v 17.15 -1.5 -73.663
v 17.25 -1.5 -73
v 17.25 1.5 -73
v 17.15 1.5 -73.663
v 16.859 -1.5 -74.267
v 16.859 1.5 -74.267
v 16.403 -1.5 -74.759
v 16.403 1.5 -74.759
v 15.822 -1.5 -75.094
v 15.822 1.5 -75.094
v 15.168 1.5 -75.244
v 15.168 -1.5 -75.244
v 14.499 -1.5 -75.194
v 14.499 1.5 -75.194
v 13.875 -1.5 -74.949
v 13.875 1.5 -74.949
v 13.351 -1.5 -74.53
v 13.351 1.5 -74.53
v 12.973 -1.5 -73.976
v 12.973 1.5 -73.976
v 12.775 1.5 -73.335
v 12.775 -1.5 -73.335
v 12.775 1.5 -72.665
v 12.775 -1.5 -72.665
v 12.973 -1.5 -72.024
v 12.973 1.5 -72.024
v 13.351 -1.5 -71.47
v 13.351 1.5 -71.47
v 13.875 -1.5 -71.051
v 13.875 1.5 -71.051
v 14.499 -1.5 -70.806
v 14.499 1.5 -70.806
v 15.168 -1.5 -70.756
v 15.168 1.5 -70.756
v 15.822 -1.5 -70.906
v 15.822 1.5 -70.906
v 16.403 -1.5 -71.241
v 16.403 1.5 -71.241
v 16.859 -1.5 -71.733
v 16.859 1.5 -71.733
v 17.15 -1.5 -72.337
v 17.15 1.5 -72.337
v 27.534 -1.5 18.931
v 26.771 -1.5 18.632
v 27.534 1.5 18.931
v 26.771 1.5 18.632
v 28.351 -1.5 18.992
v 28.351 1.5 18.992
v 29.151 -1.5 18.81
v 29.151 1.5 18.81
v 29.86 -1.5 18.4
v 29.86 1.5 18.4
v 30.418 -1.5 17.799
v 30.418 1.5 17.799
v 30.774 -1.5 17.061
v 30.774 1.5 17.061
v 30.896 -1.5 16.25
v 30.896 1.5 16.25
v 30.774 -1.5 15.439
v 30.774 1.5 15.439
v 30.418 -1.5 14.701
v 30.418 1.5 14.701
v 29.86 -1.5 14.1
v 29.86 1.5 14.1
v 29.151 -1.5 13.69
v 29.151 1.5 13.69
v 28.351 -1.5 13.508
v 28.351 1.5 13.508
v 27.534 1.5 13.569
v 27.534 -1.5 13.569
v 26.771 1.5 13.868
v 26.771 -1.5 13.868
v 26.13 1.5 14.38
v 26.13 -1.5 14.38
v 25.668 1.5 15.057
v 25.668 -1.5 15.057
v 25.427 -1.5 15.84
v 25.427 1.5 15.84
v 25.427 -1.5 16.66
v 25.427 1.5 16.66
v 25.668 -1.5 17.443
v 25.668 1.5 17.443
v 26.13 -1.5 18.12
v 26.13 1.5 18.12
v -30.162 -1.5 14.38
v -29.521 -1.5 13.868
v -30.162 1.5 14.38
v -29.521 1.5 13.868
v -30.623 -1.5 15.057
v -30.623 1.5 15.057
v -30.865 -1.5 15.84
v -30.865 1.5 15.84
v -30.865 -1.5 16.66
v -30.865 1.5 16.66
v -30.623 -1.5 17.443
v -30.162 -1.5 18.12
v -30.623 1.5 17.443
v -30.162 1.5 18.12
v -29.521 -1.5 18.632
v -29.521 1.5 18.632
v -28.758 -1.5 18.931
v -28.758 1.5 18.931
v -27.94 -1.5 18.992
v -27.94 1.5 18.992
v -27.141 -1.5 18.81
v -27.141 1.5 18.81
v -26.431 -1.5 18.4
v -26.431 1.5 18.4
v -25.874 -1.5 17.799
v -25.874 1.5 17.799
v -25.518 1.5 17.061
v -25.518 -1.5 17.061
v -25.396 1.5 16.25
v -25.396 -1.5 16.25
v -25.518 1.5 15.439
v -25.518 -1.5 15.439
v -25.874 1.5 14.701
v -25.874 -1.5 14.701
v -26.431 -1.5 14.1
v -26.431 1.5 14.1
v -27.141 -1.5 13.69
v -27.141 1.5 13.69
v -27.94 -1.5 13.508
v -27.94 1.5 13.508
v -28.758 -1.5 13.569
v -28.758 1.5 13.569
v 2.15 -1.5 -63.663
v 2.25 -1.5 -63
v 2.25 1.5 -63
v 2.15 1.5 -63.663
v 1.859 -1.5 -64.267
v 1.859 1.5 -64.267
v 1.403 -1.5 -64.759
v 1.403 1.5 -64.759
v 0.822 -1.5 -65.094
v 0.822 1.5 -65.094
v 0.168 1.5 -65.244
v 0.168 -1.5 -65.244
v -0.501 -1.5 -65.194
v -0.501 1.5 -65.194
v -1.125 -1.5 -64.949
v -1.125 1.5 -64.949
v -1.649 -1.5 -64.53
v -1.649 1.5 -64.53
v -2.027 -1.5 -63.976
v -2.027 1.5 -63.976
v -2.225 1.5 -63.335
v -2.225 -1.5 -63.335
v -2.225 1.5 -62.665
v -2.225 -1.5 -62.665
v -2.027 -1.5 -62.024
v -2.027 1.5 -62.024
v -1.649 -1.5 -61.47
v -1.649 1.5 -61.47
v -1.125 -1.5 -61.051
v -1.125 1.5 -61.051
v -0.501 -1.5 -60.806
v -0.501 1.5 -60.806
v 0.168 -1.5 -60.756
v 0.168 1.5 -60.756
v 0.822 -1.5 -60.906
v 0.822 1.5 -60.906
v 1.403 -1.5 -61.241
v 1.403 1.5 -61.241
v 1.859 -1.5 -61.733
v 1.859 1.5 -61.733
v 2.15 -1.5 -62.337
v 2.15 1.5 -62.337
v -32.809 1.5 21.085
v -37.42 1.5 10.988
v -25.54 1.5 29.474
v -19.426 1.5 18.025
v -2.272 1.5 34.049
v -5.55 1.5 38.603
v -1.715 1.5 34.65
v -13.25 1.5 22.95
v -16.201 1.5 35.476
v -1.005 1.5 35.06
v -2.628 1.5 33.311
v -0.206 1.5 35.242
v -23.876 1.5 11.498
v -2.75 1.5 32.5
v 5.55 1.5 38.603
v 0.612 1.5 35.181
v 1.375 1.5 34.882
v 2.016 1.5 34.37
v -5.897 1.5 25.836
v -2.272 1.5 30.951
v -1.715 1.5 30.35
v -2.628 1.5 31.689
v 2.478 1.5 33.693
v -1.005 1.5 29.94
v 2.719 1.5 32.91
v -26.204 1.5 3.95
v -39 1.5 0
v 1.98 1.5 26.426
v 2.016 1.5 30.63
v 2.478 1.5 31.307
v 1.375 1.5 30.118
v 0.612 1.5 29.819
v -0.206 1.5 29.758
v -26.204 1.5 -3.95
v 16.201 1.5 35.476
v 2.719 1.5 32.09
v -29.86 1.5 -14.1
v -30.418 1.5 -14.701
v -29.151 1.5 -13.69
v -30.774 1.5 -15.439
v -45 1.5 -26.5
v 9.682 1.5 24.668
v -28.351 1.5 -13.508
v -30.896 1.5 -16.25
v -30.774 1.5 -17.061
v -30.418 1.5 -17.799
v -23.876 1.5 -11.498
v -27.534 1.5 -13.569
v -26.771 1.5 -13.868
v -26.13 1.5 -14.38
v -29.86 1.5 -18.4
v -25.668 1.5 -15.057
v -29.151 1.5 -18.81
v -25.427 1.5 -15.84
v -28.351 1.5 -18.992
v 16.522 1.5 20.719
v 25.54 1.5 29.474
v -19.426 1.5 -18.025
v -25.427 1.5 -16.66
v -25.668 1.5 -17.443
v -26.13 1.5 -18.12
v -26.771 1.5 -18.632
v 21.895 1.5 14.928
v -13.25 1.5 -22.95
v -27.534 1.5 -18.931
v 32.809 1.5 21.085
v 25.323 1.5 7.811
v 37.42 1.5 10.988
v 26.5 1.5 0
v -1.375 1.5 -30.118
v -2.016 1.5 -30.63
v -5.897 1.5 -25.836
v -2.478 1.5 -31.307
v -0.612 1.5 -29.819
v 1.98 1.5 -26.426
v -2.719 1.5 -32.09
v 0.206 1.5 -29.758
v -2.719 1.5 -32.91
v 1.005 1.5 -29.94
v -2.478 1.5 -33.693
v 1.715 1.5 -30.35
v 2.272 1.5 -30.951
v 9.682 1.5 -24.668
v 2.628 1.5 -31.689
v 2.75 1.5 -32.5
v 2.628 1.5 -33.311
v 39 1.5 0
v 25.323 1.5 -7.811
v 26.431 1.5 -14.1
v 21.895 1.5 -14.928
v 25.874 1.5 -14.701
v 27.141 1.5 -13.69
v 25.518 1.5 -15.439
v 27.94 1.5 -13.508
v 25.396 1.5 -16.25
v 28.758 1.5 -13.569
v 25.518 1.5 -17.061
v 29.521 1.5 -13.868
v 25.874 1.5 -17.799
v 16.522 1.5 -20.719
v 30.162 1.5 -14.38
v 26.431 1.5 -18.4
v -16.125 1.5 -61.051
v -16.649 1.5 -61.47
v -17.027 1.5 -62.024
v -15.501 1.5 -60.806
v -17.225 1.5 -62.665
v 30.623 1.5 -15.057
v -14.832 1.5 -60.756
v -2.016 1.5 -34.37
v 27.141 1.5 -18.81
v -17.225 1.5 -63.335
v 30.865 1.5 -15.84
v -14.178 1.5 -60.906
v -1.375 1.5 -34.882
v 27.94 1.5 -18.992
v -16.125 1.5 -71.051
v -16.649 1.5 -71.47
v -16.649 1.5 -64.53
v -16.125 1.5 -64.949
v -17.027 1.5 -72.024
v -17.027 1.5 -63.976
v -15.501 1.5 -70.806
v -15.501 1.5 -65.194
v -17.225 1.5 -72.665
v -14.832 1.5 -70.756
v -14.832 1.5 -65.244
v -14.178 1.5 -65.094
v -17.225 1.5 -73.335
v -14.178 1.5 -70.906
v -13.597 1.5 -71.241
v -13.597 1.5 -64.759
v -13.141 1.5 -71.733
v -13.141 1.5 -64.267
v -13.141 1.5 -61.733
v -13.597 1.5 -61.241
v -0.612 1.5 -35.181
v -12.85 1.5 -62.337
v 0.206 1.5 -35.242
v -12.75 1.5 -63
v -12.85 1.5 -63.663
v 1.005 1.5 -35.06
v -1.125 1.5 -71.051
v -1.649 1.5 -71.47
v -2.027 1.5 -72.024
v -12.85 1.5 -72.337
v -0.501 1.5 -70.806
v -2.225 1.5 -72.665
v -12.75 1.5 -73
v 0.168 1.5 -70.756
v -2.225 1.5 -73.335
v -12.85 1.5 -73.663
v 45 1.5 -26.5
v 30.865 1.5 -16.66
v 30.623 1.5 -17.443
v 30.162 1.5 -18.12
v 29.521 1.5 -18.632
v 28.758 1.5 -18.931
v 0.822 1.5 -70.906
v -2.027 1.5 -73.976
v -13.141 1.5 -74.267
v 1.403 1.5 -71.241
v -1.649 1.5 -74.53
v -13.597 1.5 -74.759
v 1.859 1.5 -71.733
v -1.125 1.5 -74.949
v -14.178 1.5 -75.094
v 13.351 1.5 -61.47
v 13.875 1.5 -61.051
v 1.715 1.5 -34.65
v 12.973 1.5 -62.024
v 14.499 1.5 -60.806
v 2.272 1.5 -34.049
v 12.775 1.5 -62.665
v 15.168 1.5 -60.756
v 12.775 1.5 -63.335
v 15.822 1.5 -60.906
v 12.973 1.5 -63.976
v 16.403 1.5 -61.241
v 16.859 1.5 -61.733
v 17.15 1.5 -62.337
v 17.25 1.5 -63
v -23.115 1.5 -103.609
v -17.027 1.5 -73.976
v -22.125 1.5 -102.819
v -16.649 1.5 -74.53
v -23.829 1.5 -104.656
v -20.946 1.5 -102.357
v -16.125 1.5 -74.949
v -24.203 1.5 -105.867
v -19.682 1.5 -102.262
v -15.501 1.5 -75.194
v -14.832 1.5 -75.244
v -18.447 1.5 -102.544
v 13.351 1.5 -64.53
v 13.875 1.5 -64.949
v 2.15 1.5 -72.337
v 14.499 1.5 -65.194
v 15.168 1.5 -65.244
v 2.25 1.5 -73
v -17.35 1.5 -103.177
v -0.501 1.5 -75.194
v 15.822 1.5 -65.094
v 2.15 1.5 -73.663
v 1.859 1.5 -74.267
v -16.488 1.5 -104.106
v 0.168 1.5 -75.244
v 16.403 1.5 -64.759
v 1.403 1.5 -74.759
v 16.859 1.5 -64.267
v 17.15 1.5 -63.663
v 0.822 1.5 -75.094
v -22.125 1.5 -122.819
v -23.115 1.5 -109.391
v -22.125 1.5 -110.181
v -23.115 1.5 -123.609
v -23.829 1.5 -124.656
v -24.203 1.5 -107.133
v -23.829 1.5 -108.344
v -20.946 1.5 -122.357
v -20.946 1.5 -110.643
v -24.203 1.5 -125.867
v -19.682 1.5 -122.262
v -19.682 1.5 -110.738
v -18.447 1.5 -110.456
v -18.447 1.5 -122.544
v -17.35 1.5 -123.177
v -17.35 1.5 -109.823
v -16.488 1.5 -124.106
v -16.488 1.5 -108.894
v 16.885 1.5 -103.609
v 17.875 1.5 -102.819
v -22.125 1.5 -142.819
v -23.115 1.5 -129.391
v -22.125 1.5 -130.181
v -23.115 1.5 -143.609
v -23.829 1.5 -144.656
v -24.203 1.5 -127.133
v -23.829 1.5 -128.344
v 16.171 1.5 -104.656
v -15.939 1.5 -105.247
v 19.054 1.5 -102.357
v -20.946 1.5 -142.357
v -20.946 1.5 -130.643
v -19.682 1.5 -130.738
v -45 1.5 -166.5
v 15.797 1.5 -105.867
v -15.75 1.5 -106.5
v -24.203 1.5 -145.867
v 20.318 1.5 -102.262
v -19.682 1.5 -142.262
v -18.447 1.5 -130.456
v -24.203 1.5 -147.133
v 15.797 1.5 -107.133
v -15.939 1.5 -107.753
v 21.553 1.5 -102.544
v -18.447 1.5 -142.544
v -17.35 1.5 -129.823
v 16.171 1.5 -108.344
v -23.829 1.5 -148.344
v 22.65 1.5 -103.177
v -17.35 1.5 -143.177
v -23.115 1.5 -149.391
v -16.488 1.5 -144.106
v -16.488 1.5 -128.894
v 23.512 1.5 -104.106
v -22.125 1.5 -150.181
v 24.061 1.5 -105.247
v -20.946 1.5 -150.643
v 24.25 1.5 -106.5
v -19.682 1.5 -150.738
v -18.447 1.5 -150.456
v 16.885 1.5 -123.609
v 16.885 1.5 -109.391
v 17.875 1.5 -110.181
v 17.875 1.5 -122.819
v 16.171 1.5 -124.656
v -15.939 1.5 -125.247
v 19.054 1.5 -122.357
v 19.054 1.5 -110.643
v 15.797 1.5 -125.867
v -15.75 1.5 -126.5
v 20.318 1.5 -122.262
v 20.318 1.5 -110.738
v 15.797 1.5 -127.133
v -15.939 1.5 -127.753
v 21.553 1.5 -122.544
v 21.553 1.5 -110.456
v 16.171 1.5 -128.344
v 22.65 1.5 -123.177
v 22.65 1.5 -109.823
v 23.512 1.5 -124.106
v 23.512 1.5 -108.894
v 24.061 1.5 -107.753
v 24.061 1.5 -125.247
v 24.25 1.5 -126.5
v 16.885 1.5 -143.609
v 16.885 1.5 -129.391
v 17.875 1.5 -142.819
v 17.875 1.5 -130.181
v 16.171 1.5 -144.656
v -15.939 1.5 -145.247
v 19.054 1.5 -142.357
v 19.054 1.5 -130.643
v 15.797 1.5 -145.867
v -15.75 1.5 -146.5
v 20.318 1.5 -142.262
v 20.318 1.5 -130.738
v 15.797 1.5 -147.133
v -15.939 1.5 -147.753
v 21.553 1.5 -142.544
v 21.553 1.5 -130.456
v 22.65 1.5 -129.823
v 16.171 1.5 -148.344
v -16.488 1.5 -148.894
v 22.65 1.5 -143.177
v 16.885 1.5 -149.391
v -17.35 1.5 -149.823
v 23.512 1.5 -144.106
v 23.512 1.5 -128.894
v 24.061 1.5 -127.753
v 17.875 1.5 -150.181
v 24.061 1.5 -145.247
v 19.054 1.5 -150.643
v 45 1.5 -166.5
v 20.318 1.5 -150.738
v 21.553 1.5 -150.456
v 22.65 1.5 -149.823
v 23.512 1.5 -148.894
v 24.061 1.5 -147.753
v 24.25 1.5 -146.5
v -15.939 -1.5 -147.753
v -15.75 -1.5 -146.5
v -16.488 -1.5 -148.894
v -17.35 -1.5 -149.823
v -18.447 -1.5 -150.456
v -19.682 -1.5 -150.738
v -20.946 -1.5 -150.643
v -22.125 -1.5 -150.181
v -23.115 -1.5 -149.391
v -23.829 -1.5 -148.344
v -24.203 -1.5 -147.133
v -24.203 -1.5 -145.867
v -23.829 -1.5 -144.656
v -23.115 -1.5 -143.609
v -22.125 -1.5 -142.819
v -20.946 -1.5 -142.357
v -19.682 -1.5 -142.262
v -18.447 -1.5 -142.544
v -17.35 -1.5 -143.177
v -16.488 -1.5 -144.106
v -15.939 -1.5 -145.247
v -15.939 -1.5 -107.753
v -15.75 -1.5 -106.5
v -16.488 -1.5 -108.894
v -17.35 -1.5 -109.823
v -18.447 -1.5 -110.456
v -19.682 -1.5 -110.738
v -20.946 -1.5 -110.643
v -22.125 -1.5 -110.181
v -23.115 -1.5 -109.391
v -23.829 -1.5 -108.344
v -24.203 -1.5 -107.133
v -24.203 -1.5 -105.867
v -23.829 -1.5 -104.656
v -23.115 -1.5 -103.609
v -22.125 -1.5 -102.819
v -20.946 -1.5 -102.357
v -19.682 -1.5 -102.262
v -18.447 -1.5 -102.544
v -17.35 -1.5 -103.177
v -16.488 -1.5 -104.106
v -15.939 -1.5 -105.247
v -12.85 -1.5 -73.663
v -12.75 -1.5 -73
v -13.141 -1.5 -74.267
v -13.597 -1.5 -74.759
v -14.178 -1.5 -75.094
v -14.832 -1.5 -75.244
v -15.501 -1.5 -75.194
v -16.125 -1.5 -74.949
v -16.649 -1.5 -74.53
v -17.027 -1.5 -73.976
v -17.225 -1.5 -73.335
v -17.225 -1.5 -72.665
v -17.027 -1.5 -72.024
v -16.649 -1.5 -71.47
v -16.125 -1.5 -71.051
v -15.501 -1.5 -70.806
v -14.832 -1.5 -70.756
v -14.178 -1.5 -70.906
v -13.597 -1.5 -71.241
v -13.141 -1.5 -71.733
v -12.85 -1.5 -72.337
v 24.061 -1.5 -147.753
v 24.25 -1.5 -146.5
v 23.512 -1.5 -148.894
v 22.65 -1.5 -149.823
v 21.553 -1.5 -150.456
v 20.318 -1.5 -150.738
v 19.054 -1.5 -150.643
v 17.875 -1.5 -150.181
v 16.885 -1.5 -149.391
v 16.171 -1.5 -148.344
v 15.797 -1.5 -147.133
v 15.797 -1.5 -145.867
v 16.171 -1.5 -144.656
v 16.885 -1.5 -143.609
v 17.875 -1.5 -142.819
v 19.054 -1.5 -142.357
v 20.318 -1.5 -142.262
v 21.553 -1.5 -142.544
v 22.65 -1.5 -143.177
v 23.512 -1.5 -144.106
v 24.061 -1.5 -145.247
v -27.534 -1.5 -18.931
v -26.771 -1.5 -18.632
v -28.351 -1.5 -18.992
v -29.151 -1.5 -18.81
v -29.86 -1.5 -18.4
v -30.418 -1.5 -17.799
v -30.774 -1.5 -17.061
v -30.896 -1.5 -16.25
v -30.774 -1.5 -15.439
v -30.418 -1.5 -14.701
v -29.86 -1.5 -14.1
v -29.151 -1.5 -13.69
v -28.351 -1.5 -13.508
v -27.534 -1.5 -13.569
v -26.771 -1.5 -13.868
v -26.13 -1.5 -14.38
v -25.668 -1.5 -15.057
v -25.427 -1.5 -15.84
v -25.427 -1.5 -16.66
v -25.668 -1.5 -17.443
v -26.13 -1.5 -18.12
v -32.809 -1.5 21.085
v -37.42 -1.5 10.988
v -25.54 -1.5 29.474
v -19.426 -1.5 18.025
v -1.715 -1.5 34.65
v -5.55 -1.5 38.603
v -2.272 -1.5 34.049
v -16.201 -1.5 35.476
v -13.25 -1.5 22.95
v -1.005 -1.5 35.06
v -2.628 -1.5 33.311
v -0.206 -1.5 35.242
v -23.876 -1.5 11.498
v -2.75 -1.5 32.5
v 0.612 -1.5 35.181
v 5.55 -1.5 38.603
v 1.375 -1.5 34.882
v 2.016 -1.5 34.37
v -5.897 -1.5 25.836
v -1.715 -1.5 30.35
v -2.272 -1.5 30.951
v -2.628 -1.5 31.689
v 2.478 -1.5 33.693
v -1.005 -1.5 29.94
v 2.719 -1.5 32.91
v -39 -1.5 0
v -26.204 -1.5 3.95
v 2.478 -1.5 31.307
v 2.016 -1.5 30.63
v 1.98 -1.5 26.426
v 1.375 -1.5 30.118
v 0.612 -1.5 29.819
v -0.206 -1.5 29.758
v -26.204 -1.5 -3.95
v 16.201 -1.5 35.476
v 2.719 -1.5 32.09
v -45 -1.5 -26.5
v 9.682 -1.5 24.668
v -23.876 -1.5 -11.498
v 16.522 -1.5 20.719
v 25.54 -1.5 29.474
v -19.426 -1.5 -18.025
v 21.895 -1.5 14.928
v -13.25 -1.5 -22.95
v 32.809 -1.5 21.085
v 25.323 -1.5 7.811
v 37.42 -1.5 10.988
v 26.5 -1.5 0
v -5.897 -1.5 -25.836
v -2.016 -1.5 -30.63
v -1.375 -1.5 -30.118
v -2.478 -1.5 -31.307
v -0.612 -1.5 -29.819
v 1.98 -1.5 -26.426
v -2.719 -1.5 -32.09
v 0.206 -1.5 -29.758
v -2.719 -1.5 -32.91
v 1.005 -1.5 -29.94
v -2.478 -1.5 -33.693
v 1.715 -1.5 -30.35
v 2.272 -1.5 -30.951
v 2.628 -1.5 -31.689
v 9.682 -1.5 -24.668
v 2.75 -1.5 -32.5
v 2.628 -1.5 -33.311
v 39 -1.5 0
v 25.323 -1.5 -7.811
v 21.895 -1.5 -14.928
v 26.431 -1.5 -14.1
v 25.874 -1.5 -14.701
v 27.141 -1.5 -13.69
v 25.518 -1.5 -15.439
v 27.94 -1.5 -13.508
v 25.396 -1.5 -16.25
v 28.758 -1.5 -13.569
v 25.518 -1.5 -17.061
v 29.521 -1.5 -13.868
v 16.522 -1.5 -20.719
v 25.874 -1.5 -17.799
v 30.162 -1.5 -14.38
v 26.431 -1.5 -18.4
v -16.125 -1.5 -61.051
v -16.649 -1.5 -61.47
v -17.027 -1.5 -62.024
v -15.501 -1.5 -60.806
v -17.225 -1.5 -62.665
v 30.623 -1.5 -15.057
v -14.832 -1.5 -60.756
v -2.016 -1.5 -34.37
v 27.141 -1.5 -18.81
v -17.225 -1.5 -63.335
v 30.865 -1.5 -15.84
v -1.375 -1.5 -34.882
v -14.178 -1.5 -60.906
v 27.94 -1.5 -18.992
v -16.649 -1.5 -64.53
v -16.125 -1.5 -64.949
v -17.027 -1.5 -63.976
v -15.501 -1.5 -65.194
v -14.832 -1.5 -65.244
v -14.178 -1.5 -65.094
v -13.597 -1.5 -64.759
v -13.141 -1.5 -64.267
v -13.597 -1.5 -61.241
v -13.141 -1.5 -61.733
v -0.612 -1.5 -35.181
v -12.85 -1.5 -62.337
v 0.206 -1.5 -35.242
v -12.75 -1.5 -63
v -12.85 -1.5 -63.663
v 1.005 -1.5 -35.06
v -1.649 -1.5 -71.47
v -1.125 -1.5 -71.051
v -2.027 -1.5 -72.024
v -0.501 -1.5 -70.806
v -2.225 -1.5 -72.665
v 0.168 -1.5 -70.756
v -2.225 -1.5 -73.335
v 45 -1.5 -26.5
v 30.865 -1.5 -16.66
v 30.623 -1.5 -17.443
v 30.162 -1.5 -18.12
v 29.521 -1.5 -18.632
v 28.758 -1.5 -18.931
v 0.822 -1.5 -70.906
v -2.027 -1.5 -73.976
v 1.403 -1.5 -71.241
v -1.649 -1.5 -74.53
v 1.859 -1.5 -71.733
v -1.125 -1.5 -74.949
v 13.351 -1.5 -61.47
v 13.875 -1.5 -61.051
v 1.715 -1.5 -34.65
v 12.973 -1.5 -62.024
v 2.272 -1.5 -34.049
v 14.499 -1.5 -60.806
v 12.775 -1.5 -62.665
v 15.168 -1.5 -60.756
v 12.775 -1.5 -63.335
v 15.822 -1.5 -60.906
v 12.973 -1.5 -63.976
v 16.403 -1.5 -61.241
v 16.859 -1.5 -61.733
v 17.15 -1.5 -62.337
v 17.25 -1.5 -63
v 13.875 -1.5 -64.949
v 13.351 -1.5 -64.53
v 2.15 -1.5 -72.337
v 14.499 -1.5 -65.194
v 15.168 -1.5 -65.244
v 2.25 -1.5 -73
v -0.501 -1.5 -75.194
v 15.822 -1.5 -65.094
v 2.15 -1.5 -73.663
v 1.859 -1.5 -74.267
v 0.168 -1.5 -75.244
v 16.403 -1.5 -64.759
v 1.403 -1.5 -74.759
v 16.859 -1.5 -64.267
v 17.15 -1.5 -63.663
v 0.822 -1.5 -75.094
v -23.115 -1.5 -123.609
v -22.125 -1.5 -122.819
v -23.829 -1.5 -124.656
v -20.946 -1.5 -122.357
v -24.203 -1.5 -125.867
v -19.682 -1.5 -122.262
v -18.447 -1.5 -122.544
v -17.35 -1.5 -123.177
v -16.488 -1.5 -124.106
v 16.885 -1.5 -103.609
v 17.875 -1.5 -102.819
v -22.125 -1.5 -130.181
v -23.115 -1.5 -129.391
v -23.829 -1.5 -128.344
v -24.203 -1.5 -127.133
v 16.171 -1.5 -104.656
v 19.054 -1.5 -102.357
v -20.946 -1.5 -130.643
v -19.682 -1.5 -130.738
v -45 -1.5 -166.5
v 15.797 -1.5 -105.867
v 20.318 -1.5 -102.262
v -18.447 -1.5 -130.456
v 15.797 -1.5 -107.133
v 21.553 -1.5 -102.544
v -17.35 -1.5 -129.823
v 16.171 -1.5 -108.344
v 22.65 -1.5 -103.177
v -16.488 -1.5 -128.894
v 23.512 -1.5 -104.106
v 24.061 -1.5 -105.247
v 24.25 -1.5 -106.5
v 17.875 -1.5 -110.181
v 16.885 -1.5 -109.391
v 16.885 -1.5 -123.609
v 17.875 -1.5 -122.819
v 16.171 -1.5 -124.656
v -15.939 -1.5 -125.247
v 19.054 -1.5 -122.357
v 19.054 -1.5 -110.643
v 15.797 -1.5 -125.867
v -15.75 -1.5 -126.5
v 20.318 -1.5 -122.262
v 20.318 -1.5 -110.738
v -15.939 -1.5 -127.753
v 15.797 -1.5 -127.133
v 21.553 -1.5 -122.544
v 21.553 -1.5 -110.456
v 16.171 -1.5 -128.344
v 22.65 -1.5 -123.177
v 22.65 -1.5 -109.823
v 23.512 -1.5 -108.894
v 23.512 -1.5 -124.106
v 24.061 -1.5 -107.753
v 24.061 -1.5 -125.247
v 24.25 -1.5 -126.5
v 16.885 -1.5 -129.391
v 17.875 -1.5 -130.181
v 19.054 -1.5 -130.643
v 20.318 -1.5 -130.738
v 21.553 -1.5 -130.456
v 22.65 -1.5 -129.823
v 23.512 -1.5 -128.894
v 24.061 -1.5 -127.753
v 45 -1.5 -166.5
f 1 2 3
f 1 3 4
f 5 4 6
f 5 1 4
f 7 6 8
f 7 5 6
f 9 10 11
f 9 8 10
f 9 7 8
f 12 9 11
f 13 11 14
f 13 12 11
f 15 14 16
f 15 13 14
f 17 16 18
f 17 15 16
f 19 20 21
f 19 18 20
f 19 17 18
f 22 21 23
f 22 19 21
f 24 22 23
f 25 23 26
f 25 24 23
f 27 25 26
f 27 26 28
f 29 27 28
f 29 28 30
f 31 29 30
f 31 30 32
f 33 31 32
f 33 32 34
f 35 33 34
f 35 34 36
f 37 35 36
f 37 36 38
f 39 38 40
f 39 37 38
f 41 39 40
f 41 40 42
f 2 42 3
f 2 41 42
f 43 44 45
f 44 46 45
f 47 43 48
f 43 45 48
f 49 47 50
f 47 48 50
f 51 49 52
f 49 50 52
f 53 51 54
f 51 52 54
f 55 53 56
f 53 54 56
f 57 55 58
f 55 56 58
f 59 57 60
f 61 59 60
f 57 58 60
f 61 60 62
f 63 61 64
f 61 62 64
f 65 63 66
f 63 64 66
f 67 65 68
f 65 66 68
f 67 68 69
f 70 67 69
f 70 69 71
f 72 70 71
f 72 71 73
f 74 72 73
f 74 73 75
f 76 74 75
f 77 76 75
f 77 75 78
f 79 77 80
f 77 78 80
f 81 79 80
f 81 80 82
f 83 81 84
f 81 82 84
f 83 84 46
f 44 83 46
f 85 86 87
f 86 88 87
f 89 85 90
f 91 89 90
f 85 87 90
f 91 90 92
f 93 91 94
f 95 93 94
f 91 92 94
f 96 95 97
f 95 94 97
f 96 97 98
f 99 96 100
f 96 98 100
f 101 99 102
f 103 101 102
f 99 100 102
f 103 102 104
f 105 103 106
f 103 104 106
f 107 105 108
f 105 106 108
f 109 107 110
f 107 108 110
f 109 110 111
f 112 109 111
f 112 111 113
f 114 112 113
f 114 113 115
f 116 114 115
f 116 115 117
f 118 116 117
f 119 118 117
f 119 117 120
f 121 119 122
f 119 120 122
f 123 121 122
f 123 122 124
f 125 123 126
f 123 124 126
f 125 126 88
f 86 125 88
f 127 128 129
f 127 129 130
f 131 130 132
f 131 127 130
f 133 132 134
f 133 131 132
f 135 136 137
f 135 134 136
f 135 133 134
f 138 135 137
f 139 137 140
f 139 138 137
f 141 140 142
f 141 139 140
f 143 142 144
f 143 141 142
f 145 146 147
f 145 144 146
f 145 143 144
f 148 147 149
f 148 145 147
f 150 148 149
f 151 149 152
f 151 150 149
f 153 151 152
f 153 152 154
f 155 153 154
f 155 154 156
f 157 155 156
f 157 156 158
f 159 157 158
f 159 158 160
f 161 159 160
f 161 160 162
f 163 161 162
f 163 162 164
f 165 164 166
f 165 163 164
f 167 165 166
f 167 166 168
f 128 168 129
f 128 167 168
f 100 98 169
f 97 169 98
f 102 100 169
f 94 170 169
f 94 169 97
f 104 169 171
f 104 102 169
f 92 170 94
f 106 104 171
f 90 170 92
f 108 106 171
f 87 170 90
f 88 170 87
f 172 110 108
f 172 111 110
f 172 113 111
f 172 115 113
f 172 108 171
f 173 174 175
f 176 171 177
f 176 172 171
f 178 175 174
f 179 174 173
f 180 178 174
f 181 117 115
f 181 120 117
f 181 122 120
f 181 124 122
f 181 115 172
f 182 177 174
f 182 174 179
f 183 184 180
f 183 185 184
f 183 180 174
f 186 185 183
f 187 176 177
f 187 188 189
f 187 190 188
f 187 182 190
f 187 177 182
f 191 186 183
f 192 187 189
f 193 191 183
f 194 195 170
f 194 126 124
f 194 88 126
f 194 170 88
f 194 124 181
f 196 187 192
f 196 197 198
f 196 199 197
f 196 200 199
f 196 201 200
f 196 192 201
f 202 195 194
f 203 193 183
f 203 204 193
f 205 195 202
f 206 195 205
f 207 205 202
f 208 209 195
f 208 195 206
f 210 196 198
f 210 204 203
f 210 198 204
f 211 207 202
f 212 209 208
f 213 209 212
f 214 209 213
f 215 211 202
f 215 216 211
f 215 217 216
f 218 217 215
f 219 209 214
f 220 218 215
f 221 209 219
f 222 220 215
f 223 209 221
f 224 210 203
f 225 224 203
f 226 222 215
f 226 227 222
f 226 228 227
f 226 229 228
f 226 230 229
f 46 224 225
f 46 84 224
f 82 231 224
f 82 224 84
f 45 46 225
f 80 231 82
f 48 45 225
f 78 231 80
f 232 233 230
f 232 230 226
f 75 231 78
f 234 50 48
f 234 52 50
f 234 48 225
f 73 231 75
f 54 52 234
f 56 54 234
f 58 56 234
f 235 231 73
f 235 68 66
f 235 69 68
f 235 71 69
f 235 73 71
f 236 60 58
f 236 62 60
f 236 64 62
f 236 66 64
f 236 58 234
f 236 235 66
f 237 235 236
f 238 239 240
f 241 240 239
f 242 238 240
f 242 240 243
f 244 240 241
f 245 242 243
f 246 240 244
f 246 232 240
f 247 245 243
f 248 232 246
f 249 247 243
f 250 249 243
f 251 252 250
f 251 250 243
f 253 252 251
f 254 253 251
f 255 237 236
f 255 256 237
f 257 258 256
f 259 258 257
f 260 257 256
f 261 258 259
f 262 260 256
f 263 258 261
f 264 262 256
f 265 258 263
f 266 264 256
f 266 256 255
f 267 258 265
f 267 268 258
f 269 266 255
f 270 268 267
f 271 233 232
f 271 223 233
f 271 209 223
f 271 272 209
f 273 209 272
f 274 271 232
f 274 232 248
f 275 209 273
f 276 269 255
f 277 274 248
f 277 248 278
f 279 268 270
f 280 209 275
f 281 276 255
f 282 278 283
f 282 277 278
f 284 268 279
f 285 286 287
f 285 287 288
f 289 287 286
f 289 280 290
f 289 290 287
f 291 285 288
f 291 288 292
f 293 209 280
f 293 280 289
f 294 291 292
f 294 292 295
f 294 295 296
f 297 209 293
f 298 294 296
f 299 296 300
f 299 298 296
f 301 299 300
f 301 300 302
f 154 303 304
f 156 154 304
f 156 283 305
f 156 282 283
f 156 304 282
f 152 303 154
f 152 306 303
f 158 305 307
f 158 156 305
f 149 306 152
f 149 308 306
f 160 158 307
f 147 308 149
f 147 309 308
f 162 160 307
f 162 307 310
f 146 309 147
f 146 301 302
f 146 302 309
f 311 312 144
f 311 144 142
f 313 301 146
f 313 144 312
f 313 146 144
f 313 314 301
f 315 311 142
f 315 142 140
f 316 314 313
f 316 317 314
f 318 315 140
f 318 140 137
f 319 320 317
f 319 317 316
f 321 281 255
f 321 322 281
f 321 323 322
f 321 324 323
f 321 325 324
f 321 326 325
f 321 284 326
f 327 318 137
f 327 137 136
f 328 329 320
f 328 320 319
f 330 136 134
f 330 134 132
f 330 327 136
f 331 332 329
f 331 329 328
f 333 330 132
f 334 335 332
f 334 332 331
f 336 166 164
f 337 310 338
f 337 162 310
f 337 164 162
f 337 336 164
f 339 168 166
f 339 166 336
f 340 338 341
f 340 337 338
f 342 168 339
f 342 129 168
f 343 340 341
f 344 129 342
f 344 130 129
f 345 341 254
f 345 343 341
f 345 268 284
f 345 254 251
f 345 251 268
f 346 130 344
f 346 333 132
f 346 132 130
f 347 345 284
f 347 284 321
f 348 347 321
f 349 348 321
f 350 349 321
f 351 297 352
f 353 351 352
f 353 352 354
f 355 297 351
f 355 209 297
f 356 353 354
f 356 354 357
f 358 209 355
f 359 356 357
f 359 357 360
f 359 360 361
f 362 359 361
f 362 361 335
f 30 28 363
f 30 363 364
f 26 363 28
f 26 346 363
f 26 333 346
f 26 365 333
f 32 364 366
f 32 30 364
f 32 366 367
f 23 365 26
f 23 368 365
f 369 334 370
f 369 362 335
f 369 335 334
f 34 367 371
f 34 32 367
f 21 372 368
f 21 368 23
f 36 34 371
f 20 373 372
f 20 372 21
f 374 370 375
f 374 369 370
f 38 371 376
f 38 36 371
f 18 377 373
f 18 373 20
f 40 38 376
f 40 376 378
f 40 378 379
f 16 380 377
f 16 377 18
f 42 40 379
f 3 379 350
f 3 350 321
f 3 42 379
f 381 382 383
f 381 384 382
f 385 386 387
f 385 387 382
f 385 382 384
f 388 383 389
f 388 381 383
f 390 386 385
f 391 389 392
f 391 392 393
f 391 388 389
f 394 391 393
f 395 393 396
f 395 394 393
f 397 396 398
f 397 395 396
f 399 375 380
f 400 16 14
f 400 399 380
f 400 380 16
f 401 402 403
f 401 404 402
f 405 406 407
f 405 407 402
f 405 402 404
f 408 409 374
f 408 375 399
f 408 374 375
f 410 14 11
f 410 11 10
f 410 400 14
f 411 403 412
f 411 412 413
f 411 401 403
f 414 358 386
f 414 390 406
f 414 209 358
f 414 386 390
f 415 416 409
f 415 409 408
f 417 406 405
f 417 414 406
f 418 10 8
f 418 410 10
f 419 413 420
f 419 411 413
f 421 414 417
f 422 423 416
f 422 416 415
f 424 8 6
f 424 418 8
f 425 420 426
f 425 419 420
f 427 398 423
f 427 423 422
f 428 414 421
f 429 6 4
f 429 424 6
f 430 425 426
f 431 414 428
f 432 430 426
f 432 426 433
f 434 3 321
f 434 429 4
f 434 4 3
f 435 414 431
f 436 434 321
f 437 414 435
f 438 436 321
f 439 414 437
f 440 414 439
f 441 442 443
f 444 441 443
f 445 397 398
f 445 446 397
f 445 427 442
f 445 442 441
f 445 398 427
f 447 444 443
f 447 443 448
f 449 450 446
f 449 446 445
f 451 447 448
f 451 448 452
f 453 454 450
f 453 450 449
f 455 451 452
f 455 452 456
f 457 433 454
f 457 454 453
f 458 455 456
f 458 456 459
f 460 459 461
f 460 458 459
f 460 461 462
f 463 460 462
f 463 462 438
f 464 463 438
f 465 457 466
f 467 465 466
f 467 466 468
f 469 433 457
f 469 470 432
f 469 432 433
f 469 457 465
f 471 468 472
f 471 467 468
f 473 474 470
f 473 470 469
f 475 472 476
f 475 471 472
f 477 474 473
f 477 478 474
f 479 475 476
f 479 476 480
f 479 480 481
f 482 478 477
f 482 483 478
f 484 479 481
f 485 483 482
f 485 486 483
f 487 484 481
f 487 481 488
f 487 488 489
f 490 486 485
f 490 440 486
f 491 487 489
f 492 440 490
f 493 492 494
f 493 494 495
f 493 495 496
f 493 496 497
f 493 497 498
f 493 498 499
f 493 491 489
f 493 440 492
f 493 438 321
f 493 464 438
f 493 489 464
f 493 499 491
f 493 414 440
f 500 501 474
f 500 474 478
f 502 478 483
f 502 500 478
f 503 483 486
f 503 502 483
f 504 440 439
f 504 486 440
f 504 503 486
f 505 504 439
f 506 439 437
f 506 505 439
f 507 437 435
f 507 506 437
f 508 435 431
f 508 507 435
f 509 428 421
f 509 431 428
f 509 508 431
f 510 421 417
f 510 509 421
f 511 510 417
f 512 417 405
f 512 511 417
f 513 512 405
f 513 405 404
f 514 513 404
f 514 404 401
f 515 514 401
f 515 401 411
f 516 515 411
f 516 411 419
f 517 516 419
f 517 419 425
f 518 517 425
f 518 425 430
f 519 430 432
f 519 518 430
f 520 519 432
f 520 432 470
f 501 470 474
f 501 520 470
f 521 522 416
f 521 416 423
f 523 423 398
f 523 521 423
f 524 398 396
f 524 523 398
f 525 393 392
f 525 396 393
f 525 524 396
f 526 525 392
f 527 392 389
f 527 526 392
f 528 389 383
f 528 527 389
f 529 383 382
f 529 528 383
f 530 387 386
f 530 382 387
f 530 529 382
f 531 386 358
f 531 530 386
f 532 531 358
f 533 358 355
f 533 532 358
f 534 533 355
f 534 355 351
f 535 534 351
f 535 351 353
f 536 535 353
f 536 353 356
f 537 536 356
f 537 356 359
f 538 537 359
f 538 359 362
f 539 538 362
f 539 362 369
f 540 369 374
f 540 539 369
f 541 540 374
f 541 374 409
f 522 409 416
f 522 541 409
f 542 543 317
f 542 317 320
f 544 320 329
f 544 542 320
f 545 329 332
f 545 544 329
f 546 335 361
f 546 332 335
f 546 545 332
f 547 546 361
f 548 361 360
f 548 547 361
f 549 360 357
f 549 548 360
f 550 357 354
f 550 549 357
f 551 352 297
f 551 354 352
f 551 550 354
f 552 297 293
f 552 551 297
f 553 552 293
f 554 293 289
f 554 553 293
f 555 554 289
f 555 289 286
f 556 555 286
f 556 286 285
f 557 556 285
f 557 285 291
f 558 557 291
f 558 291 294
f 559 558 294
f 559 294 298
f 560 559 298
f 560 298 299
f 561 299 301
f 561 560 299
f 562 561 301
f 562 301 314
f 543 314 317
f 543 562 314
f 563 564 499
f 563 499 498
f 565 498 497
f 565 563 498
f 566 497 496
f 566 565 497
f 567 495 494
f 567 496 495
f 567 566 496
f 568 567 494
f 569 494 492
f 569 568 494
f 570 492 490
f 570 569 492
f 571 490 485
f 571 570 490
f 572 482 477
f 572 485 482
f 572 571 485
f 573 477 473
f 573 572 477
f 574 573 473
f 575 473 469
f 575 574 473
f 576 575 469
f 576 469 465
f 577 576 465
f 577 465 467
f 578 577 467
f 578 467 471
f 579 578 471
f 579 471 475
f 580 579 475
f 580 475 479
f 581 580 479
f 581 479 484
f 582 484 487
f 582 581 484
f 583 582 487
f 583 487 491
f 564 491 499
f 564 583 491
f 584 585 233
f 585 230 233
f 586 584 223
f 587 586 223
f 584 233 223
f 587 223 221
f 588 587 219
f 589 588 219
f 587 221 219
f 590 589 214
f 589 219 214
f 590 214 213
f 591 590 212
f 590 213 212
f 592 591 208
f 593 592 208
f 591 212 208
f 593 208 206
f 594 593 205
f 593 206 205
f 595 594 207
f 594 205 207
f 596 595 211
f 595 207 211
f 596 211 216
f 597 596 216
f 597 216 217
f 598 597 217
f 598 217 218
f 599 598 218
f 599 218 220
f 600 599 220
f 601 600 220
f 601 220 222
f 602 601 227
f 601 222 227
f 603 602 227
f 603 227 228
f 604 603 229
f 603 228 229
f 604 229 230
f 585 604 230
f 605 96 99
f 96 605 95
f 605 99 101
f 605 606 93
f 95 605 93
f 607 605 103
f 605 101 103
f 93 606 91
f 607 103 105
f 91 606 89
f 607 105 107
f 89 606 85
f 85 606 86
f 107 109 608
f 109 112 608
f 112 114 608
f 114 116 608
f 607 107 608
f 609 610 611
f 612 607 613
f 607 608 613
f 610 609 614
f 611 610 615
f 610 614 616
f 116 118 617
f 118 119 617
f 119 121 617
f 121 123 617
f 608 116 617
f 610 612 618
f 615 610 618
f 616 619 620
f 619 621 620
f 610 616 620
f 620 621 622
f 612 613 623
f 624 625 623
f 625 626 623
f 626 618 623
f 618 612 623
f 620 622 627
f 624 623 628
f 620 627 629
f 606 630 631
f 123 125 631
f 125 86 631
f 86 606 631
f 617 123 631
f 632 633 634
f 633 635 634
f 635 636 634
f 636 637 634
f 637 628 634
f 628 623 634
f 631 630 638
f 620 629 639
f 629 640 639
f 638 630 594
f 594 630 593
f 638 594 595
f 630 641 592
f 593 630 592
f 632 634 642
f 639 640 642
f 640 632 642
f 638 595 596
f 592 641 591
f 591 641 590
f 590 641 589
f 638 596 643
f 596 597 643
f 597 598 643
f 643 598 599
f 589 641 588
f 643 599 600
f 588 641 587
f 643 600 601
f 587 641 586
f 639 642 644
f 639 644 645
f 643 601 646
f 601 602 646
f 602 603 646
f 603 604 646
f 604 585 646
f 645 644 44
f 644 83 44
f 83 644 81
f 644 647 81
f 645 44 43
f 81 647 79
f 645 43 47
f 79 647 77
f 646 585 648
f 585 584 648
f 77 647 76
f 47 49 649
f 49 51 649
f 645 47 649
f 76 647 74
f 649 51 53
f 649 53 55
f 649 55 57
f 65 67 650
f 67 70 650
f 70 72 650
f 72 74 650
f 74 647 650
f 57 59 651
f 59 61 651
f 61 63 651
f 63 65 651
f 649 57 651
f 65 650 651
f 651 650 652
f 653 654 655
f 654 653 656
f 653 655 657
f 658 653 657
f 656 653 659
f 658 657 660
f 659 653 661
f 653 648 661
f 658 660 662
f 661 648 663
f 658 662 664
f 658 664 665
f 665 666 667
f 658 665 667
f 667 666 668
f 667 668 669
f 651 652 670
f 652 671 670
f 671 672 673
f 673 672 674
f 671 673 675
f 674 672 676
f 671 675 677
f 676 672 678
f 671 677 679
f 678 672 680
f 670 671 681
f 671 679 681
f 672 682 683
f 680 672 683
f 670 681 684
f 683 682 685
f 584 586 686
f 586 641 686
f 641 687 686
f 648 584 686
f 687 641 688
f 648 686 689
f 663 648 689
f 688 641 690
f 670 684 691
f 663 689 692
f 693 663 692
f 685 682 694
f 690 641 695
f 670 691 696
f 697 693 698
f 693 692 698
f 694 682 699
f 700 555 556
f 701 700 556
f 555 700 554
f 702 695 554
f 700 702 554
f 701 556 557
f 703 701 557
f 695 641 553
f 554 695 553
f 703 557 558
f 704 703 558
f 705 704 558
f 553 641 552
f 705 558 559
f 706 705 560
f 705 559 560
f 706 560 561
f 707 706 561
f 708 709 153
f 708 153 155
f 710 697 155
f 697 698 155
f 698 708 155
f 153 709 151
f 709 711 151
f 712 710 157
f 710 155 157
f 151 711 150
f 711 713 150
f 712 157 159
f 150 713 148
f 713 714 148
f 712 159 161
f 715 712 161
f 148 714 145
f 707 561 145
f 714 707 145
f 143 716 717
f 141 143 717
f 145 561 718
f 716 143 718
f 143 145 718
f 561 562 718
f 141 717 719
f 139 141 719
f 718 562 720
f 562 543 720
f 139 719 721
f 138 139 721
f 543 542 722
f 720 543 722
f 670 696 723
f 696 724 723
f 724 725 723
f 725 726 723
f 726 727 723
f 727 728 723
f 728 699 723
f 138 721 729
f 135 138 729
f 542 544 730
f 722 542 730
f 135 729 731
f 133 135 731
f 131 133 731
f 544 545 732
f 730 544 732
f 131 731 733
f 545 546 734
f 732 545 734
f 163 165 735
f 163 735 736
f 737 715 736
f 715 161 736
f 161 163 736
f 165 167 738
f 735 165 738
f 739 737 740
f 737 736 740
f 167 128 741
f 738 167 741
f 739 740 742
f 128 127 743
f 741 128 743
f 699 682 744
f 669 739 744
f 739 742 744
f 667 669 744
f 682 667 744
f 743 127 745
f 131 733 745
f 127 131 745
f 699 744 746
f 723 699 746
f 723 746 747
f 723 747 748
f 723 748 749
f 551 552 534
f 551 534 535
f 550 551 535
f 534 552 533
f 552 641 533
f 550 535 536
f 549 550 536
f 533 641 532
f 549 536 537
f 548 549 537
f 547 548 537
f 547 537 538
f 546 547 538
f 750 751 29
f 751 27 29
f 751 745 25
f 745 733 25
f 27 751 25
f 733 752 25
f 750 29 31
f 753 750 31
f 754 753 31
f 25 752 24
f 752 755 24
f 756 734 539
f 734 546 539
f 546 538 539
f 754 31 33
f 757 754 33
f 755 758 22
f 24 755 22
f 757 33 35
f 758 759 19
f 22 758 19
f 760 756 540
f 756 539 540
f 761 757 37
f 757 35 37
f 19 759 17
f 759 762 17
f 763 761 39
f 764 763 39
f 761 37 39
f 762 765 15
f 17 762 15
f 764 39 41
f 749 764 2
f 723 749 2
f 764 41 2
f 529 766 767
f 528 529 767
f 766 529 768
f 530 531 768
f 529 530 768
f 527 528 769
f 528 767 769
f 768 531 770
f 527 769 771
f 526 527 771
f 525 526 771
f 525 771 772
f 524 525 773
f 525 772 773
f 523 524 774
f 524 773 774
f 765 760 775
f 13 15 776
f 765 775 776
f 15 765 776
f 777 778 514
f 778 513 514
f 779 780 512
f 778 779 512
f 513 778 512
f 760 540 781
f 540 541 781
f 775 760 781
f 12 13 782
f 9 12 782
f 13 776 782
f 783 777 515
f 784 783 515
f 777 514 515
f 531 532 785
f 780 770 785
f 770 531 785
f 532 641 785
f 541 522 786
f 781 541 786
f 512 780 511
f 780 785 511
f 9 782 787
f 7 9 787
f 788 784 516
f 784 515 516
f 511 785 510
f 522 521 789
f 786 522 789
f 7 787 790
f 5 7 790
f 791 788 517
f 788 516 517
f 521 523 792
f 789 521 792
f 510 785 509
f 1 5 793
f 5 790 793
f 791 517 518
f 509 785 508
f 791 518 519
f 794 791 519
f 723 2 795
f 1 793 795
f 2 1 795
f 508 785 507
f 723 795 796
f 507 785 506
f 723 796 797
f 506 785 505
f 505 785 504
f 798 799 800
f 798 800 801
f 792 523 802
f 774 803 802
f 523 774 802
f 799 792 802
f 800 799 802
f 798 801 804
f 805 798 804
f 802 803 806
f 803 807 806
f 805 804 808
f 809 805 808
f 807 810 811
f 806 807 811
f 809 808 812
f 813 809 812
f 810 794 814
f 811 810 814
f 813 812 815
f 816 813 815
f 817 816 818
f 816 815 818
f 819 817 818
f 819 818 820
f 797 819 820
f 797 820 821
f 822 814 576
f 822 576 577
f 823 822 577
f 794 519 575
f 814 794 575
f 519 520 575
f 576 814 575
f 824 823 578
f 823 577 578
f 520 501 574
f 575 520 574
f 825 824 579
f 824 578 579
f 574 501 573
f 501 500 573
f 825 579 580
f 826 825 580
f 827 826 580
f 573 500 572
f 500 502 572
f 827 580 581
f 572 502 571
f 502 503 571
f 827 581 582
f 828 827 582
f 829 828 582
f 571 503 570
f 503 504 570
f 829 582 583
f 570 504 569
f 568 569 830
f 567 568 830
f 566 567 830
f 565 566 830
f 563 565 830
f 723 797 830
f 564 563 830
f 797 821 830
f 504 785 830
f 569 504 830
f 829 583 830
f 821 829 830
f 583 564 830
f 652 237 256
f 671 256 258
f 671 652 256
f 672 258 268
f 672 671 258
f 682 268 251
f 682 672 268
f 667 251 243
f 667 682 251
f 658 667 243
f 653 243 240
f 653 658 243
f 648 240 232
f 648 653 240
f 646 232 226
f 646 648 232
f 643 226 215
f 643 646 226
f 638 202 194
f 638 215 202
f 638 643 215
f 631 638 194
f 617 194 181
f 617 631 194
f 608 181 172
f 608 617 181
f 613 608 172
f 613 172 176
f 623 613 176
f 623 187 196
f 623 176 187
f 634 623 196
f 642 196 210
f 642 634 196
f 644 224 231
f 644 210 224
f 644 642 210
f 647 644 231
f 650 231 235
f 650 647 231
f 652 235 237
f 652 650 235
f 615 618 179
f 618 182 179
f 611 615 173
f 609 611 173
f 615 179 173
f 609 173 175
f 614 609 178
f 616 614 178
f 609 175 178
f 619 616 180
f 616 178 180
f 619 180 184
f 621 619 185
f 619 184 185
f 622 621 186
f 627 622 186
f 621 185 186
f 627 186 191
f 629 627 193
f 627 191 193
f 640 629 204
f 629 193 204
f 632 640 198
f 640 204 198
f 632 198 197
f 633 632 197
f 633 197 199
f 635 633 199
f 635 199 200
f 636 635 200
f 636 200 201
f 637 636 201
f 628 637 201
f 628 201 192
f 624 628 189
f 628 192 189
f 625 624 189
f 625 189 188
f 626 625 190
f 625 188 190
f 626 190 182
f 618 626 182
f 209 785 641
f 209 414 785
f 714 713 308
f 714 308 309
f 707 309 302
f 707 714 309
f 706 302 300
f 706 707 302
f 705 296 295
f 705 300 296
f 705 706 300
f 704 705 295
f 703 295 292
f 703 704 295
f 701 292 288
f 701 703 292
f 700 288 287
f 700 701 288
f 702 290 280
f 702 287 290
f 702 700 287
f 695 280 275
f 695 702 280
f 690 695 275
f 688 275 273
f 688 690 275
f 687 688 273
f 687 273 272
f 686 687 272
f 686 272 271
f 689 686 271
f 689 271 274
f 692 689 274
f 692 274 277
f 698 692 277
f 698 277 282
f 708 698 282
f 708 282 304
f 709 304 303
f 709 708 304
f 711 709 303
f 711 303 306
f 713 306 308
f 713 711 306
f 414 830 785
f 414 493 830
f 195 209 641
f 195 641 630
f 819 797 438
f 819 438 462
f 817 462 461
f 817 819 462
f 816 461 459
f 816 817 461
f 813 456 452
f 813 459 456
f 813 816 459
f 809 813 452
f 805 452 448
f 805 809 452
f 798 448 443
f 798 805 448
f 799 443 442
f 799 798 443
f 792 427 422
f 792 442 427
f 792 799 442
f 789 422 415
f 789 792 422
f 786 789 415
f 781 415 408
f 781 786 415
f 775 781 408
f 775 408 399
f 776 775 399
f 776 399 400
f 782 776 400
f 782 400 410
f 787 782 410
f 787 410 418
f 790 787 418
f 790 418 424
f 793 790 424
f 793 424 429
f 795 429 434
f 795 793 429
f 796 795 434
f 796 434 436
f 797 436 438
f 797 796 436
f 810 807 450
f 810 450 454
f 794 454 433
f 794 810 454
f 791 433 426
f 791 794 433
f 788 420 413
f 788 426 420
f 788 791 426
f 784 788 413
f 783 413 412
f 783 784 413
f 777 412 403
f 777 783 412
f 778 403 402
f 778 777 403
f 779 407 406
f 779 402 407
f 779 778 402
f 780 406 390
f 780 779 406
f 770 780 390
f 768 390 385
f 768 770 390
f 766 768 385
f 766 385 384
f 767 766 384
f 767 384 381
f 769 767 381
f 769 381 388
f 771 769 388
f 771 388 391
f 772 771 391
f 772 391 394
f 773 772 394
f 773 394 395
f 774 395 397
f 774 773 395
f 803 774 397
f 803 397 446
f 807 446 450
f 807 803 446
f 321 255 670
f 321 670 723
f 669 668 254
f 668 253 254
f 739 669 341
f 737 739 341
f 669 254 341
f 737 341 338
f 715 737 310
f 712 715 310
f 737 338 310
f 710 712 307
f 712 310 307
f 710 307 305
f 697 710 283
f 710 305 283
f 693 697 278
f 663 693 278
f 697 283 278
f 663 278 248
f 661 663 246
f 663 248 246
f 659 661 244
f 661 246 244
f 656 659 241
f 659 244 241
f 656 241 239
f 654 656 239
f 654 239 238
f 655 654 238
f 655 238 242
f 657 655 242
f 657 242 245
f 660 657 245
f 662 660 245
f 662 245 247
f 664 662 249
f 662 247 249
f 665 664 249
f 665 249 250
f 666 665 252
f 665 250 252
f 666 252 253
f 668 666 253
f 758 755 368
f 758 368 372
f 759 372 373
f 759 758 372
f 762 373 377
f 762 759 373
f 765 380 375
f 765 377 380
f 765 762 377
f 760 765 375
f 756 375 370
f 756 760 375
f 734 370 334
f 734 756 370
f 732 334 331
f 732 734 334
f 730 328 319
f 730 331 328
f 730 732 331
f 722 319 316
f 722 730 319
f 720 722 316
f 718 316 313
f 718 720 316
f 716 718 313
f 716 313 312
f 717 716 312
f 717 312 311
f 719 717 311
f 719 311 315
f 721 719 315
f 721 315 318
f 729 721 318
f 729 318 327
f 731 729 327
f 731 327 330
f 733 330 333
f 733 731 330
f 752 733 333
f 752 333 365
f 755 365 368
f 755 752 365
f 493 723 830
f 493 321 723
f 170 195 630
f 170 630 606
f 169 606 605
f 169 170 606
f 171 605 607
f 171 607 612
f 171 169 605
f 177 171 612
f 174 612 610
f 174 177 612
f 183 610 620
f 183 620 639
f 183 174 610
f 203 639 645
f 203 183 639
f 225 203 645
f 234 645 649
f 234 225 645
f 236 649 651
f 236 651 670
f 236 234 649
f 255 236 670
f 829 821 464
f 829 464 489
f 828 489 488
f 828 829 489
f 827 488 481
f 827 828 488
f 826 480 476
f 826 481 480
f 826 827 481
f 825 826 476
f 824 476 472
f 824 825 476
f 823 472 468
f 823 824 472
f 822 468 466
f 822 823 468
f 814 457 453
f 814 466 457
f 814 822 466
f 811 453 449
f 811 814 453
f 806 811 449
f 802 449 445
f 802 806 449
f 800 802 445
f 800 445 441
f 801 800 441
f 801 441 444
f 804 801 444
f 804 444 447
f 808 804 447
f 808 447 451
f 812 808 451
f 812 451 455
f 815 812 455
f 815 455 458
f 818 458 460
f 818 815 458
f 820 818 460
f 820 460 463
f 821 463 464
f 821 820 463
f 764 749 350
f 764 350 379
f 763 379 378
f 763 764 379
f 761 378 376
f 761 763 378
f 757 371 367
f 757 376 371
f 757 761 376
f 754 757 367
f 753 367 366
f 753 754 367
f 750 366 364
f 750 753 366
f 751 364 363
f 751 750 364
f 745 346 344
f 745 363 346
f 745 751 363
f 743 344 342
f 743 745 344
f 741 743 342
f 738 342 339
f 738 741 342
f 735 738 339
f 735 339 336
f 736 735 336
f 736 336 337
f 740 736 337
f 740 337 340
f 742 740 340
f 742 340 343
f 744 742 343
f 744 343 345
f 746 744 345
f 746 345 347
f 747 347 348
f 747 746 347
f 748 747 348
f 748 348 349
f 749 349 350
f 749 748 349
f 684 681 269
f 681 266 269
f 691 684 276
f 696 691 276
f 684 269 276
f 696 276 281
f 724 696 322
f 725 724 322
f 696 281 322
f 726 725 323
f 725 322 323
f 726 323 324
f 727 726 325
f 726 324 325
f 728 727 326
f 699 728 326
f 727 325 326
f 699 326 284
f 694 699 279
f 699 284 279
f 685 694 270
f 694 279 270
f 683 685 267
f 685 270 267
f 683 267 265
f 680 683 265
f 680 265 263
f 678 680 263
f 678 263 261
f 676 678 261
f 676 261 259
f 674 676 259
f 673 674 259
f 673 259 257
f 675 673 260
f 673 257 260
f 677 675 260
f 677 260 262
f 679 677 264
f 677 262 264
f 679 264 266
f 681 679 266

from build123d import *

# Parameters (mm, degrees)
SKETCH1_R            = 39
SKETCH1_R_2          = 26.5
BOSS_EXTRUDE1_DEPTH  = 1.5
SKETCH3_W            = 50
SKETCH3_H            = 51.5
BOSS_EXTRUDE2_DEPTH  = 1.5
BOSS_EXTRUDE4_DEPTH  = 1.5
SKETCH2_R            = 2.75
CUT_EXTRUDE1_DEPTH   = 2.5
CIRPATTERN1_COUNT    = 6
CUT_EXTRUDE2_START   = -4
SKETCH5_R            = 2.25
CUT_EXTRUDE2_DEPTH   = 5
LPATTERN1_COUNT      = 2
LPATTERN1_PITCH      = 15
LPATTERN1_COUNT_DIR2 = 2
LPATTERN1_PITCH_DIR2 = 10
LPATTERN2_COUNT      = 2
LPATTERN2_PITCH      = 15
LPATTERN2_COUNT_DIR2 = 2
LPATTERN2_PITCH_DIR2 = 10
CUT_EXTRUDE3_START   = -4
SKETCH7_R            = 4.25
CUT_EXTRUDE3_DEPTH   = 5
LPATTERN3_COUNT      = 3
LPATTERN3_PITCH      = 20


with BuildPart() as part:
    # Sketch1 → Boss-Extrude1 (new body, symmetric)
    with BuildSketch(Plane(origin=(0, 0, 0), x_dir=(1, 0, 0), z_dir=(0, 1, 0))):
        Circle(SKETCH1_R)
        Circle(SKETCH1_R_2, mode=Mode.SUBTRACT)
    extrude(amount=BOSS_EXTRUDE1_DEPTH, both=True)

    # Sketch3 → Boss-Extrude2 (add, symmetric)
    with BuildSketch(Plane(origin=(0, 0, 0), x_dir=(1, 0, 0), z_dir=(0, 1, 0))):
        with Locations((0, 52.25)):
            Rectangle(SKETCH3_W, SKETCH3_H)
    extrude(amount=BOSS_EXTRUDE2_DEPTH, both=True)

    # Sketch6 → Boss-Extrude4 (add, symmetric)
    with BuildSketch(Plane(origin=(0, 0, 0), x_dir=(1, 0, 0), z_dir=(0, 1, 0))):
        Polygon((-45, 166.5), (-45, 26.5), (-39, 0), (-14.981514186, 26.5), (16.520833333, 26.5), (39, 0), (45, 26.5), (45, 166.5), align=None)
    extrude(amount=BOSS_EXTRUDE4_DEPTH, both=True)

    # Sketch2 → Cut-Extrude1 (cut, symmetric)
    with BuildSketch(Plane(origin=(0, 0, 0), x_dir=(1, 0, 0), z_dir=(0, 1, 0))):
        with Locations((0, 32.5)):
            Circle(SKETCH2_R)
    cut_extrude1 = extrude(amount=CUT_EXTRUDE1_DEPTH, both=True, mode=Mode.SUBTRACT)

    # CirPattern1: Cut-Extrude1 ×6 about axis
    cirpattern1_axis = Axis((0, 0, 0), (0, 1, 0))
    for i in range(1, CIRPATTERN1_COUNT):
        add(cut_extrude1.rotate(cirpattern1_axis, i * 360 / CIRPATTERN1_COUNT), mode=Mode.SUBTRACT)

    # Sketch5 → Cut-Extrude2 (cut)
    with BuildSketch(Plane(origin=(0, 1.5, 0), x_dir=(1, 0, 0), z_dir=(0, 1, 0)).offset(CUT_EXTRUDE2_START)):
        with Locations((0, 73)):
            Circle(SKETCH5_R)
    cut_extrude2 = extrude(amount=CUT_EXTRUDE2_DEPTH, mode=Mode.SUBTRACT)

    # LPattern1: Cut-Extrude2 2 × 2
    with Locations(*[(i * LPATTERN1_PITCH, 0, j * LPATTERN1_PITCH_DIR2) for i in range(LPATTERN1_COUNT) for j in range(LPATTERN1_COUNT_DIR2) if (i, j) != (0, 0)]):
        add(cut_extrude2, mode=Mode.SUBTRACT)

    # LPattern2: Cut-Extrude2 2 × 2
    with Locations(*[(-i * LPATTERN2_PITCH, 0, j * LPATTERN2_PITCH_DIR2) for i in range(LPATTERN2_COUNT) for j in range(LPATTERN2_COUNT_DIR2) if (i, j) != (0, 0)]):
        add(cut_extrude2, mode=Mode.SUBTRACT)

    # Sketch7 → Cut-Extrude3 (cut)
    with BuildSketch(Plane(origin=(0, 1.5, 0), x_dir=(1, 0, 0), z_dir=(0, 1, 0)).offset(CUT_EXTRUDE3_START)):
        with Locations((-20, 146.5)):
            Circle(SKETCH7_R)
        with Locations((20, 146.5)):
            Circle(SKETCH7_R)
    cut_extrude3 = extrude(amount=CUT_EXTRUDE3_DEPTH, mode=Mode.SUBTRACT)

    # LPattern3: Cut-Extrude3 ×3
    with Locations(*[(0, 0, i * LPATTERN3_PITCH) for i in range(1, LPATTERN3_COUNT)]):
        add(cut_extrude3, mode=Mode.SUBTRACT)


solid = part.part
